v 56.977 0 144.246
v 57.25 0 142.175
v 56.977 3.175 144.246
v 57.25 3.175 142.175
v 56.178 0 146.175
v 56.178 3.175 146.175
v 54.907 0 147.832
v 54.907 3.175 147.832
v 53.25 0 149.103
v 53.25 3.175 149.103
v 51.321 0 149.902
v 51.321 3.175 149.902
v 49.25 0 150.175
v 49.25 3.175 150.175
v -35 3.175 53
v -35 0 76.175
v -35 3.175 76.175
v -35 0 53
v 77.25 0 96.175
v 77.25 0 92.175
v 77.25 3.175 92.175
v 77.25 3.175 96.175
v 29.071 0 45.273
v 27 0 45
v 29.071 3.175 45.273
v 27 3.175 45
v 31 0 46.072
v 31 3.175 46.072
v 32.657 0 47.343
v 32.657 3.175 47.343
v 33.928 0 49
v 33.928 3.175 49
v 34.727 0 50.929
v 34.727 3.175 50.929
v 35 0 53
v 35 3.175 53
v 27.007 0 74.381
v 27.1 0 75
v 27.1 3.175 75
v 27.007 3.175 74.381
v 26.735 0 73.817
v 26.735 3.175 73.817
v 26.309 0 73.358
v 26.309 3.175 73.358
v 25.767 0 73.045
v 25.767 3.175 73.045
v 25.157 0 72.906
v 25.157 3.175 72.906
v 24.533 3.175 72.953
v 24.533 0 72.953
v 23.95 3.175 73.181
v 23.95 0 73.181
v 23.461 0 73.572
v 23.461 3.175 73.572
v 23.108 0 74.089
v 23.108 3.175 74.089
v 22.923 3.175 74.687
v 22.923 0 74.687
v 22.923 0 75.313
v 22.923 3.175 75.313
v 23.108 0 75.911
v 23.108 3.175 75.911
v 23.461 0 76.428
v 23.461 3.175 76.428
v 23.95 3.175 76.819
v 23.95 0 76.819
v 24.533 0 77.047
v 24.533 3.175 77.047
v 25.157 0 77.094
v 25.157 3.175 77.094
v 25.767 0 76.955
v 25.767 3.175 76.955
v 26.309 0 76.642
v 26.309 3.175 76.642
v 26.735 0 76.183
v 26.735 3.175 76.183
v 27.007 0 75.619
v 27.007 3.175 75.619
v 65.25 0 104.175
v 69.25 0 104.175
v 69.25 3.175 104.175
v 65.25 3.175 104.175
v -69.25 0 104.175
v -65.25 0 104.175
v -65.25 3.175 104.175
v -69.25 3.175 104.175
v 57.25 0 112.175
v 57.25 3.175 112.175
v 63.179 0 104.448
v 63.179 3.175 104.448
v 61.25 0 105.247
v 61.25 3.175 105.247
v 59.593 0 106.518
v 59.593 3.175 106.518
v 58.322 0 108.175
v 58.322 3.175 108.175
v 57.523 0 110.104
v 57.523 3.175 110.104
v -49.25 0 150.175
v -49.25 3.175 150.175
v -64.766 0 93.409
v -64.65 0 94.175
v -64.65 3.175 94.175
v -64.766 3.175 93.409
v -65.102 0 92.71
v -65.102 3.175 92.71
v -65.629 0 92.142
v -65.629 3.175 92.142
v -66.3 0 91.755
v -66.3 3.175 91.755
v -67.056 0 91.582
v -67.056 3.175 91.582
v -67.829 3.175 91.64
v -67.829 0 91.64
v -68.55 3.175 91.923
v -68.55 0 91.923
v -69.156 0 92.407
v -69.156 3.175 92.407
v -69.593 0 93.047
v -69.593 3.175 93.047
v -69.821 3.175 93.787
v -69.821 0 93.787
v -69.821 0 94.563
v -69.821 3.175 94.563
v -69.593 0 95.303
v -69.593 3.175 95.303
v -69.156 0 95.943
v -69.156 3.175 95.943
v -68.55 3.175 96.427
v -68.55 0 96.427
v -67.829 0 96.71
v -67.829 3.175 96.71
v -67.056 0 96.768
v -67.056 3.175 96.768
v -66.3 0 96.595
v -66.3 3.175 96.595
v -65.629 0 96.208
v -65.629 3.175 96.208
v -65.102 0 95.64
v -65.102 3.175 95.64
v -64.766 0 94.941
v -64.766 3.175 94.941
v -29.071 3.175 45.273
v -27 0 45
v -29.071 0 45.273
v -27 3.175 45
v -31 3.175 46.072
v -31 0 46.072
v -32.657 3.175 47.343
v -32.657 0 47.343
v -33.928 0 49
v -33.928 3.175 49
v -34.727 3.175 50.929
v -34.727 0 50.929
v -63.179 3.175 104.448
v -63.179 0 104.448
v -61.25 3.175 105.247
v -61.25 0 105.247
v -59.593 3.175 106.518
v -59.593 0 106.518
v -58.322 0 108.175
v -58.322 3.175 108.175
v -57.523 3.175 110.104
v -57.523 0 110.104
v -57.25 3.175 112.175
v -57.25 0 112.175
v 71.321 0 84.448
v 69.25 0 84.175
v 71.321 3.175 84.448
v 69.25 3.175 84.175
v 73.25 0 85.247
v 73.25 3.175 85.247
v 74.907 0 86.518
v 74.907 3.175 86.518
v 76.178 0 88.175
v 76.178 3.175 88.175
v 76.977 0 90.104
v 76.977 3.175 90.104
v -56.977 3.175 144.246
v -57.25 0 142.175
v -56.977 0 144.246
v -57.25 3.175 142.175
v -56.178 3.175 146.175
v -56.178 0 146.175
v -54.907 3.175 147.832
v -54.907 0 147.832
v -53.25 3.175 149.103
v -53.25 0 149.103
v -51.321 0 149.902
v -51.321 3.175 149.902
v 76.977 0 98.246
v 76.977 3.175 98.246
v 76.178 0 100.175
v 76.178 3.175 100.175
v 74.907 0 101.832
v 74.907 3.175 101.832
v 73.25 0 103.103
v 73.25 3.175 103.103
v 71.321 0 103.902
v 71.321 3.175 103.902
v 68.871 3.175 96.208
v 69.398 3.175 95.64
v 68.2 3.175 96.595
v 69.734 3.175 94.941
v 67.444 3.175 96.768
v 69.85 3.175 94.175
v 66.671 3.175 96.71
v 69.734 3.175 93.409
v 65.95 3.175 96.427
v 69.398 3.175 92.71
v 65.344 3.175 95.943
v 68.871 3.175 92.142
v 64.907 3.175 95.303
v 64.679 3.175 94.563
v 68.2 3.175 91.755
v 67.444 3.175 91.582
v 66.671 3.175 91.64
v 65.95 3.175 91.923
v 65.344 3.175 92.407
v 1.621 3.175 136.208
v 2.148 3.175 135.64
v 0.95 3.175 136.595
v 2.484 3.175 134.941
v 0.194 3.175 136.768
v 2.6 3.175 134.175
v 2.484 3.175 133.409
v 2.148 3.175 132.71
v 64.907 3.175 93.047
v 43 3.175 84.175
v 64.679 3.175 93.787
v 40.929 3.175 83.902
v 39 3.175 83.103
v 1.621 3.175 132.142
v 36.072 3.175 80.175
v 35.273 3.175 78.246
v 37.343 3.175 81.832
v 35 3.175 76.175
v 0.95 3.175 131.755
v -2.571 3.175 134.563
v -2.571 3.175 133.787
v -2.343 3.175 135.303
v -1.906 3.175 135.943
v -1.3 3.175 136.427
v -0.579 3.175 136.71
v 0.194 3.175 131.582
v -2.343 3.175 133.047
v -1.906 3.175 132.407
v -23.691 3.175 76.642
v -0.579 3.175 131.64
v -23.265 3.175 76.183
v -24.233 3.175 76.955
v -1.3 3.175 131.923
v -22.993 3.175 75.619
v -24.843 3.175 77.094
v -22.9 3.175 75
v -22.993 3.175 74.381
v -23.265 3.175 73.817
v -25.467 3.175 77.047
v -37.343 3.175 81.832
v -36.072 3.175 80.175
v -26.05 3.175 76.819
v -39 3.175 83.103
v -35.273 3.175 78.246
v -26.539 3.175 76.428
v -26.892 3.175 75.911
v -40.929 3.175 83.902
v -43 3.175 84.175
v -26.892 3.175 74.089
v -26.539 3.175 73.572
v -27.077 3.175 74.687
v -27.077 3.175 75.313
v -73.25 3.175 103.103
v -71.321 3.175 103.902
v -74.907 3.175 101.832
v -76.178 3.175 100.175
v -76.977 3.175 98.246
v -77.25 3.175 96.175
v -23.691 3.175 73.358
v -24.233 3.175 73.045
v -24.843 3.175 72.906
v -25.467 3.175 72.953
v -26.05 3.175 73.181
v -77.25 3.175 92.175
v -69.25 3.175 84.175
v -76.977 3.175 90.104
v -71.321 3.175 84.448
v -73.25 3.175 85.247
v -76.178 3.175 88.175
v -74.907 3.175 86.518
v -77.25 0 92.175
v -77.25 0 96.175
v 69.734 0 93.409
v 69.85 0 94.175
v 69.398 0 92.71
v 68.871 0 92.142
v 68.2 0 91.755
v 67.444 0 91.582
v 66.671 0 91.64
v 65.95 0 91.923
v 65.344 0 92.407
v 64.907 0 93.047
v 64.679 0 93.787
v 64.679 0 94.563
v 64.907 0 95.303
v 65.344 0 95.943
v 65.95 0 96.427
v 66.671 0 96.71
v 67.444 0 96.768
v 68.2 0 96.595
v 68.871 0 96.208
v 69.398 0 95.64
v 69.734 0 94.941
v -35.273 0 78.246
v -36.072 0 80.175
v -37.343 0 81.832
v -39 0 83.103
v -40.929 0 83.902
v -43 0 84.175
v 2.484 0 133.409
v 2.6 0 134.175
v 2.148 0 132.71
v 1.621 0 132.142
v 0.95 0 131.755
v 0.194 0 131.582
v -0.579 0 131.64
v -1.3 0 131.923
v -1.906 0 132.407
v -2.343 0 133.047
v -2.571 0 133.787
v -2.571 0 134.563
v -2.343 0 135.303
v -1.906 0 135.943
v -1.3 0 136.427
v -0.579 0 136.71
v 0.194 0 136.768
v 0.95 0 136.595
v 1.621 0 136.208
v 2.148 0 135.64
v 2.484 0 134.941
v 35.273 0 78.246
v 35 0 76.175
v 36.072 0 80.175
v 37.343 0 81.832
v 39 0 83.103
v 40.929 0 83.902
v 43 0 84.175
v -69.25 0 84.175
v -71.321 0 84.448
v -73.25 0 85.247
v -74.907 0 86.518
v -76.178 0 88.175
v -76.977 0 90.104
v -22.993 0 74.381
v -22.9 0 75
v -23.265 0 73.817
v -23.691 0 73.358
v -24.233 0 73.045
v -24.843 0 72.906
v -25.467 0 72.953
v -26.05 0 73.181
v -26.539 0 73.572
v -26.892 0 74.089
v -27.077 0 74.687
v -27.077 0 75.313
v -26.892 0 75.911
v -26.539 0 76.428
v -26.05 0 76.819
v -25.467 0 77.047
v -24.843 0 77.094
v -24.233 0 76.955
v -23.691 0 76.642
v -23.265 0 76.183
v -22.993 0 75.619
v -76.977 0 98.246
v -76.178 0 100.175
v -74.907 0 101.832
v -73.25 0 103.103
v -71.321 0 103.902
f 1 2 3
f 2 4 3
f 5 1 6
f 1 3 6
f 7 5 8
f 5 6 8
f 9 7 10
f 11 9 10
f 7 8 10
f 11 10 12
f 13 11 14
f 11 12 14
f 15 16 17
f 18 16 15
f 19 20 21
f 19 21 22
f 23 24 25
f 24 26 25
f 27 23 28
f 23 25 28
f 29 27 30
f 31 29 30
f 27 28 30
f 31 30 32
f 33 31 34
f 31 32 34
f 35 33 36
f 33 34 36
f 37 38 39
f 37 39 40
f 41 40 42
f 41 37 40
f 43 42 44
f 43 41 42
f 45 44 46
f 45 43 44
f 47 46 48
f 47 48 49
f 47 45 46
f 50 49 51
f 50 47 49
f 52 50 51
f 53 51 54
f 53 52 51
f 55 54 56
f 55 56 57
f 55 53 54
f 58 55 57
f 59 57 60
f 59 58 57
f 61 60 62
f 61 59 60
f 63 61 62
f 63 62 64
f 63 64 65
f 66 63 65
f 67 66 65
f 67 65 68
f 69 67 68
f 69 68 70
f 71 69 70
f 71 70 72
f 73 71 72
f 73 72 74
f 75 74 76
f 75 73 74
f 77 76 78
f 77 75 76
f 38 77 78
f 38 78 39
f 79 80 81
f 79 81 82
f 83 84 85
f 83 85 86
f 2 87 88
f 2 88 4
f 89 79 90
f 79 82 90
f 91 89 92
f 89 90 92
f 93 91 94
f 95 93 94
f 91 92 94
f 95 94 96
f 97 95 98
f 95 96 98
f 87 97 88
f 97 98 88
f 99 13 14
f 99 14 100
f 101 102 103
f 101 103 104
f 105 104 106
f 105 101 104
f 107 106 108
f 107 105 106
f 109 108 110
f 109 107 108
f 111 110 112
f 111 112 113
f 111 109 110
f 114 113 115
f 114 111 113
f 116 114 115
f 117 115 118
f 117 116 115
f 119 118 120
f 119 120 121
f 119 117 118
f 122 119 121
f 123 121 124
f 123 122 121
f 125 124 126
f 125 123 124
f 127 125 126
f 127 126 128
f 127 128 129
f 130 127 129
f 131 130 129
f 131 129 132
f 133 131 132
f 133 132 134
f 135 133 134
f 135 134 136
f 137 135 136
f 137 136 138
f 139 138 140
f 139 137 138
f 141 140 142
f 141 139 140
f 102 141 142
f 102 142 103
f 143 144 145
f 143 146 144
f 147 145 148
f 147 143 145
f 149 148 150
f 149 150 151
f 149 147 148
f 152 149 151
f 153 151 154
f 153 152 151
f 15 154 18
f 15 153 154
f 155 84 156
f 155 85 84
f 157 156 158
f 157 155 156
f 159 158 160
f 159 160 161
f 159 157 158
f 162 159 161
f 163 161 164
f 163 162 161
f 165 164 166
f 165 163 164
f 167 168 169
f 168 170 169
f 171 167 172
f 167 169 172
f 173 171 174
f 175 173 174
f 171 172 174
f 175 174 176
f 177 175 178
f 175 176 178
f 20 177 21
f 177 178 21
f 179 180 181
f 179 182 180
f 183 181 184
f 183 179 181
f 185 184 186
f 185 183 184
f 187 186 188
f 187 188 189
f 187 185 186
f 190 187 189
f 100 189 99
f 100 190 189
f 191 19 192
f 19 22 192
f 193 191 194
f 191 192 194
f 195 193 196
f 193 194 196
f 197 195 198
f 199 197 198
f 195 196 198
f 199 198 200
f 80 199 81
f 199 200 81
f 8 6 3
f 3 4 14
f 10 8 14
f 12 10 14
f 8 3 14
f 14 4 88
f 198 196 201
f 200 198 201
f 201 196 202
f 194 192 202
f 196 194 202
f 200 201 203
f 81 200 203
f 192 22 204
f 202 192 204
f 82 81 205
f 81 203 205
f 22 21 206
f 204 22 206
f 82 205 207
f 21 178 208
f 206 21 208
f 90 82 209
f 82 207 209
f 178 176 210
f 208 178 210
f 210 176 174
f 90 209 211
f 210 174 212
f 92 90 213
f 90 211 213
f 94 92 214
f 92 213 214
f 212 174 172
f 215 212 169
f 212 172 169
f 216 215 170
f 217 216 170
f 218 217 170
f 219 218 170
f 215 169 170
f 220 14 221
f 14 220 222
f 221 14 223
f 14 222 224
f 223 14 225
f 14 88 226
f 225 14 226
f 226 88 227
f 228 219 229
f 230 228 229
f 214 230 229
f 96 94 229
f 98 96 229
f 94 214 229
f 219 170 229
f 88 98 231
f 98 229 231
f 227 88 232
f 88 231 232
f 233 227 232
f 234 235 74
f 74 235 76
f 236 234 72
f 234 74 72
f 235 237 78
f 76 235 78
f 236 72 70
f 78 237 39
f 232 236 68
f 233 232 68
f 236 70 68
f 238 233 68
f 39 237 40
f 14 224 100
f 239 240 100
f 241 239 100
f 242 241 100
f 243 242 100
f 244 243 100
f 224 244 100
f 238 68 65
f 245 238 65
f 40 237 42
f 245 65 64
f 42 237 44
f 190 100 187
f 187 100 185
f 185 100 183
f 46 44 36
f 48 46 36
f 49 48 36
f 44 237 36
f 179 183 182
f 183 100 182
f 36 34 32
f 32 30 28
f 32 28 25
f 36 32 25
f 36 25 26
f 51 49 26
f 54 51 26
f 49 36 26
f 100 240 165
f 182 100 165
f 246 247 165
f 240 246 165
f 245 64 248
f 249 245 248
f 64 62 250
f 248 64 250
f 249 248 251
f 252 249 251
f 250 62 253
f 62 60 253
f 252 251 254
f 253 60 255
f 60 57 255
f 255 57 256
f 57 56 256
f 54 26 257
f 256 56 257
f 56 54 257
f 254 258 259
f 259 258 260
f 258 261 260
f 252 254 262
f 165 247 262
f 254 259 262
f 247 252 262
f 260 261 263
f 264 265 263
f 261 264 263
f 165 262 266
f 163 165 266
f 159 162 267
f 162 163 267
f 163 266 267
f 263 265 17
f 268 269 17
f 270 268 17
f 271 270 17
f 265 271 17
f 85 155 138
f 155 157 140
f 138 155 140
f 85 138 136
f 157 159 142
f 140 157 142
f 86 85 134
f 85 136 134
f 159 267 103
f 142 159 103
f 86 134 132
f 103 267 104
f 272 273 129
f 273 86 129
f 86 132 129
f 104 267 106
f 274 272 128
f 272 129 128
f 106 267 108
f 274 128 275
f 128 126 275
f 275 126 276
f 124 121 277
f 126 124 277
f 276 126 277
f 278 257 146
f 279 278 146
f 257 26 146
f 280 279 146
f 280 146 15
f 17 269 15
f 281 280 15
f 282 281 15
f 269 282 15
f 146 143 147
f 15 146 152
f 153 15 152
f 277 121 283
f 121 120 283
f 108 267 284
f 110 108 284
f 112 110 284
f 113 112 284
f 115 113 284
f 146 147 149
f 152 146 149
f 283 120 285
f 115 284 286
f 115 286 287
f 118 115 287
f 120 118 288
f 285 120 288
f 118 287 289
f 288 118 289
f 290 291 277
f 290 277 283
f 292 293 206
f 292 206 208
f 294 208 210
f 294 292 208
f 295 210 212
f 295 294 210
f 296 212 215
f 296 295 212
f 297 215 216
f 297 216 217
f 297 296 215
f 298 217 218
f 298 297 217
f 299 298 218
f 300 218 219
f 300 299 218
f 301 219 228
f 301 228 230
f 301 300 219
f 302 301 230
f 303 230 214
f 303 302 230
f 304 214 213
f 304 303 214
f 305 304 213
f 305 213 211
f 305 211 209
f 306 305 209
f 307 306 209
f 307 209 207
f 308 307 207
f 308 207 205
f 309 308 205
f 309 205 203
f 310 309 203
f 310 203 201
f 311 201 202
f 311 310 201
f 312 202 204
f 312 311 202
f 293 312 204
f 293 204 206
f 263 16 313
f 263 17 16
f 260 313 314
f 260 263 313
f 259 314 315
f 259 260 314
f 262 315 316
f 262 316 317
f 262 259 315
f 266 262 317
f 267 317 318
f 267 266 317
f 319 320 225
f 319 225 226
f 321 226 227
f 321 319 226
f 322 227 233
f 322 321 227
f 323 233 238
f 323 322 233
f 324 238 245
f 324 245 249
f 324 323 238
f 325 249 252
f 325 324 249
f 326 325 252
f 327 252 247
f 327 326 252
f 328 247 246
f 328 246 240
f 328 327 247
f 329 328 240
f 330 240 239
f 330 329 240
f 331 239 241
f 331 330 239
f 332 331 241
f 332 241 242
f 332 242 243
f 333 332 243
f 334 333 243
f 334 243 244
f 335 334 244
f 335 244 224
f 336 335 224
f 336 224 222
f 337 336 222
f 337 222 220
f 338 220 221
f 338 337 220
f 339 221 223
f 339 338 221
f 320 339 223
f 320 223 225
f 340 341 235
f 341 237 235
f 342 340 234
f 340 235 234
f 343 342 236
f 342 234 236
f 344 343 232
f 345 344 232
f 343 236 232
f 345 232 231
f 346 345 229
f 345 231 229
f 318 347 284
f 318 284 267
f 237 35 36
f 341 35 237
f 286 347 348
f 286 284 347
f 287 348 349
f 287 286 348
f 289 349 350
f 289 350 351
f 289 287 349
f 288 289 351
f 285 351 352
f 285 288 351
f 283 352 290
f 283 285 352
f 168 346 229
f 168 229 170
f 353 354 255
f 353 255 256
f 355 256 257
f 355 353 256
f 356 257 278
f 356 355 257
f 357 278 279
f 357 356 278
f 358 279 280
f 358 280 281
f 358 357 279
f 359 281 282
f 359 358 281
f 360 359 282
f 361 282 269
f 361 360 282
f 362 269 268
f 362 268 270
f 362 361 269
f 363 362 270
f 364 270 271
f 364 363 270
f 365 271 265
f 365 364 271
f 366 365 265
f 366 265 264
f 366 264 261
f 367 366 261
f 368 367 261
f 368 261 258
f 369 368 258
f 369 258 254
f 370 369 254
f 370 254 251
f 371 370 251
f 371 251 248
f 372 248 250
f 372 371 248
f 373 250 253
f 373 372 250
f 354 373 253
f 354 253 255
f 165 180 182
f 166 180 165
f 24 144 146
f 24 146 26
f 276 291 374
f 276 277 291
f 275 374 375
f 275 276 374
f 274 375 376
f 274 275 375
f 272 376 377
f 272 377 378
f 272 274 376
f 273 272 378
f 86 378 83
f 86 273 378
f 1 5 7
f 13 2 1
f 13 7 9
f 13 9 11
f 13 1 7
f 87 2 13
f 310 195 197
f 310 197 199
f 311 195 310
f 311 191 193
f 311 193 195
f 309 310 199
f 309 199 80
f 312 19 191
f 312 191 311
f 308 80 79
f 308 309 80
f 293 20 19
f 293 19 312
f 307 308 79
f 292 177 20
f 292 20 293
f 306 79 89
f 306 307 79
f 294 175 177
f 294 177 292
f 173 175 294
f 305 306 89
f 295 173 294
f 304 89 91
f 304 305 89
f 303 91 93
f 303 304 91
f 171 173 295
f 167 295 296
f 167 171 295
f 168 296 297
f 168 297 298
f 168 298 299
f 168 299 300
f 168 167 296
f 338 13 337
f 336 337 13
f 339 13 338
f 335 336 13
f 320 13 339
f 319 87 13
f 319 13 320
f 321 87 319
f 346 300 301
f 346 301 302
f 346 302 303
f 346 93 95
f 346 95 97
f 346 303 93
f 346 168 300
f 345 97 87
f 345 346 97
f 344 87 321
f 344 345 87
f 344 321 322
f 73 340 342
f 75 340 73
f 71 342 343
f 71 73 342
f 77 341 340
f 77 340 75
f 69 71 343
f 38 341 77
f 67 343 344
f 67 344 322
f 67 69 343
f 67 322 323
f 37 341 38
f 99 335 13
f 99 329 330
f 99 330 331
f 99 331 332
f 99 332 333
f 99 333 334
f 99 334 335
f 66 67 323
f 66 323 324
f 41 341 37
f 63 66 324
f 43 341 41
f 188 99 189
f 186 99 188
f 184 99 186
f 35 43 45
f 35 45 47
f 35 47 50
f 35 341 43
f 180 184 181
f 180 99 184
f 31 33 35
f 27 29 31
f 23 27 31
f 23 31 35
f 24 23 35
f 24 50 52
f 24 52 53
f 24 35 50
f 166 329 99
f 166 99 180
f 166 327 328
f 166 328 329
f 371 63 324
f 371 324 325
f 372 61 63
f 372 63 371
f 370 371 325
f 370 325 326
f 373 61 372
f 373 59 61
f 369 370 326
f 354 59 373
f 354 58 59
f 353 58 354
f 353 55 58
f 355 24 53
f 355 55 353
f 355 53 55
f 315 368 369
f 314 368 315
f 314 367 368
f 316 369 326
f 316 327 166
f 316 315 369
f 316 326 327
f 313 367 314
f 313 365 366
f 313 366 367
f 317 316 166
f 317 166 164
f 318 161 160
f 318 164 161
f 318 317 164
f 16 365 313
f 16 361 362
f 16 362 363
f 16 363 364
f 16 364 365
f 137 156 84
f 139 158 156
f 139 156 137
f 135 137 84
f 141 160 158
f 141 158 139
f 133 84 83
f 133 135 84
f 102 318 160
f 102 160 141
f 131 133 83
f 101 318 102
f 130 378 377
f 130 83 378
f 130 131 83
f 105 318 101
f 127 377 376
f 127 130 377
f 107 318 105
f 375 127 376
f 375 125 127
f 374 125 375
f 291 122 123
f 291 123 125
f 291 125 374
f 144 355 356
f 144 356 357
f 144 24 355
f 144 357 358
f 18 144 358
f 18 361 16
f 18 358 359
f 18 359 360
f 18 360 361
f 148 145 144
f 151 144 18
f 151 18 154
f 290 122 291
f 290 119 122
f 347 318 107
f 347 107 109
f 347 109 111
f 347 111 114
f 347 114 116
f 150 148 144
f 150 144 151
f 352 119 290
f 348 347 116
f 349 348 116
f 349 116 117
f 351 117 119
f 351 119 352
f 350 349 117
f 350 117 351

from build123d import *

# Parameters (mm, degrees)
SKETCH3_R           = 2.1
SKETCH3_R_2         = 2.6
BOSS_EXTRUDE1_DEPTH = 3.175
FILLET1_R           = 8


with BuildPart() as part:
    # Sketch3 → Boss-Extrude1 (new body)
    with BuildSketch(Plane(origin=(0, 0, 0), x_dir=(1, 0, 0), z_dir=(0, 1, 0))):
        Polygon((-35, -45), (35, -45), (35, -84.175), (77.25, -84.175), (77.25, -104.175), (57.25, -104.175), (57.25, -150.175), (-57.25, -150.175), (-57.25, -104.175), (-77.25, -104.175), (-77.25, -84.175), (-35, -84.175), align=None)
        with Locations((-25, -75)):
            Circle(SKETCH3_R, mode=Mode.SUBTRACT)
        with Locations((25, -75)):
            Circle(SKETCH3_R, mode=Mode.SUBTRACT)
        with Locations((-67.25, -94.175)):
            Circle(SKETCH3_R_2, mode=Mode.SUBTRACT)
        with Locations((67.25, -94.175)):
            Circle(SKETCH3_R_2, mode=Mode.SUBTRACT)
        with Locations((0, -134.175)):
            Circle(SKETCH3_R_2, mode=Mode.SUBTRACT)
    extrude(amount=BOSS_EXTRUDE1_DEPTH)

    # Fillet1
    fillet1_edges = [part.edges().sort_by_distance(p)[0] for p in [
        (35, 1.5875, 84.175),
        (77.25, 1.5875, 84.175),
        (77.25, 1.5875, 104.175),
        (57.25, 1.5875, 104.175),
        (57.25, 1.5875, 150.175),
        (-57.25, 1.5875, 150.175),
        (-57.25, 1.5875, 104.175),
        (-77.25, 1.5875, 104.175),
        (-77.25, 1.5875, 84.175),
        (-35, 1.5875, 84.175),
        (-35, 1.5875, 45),
        (35, 1.5875, 45),
    ]]
    fillet(fillet1_edges, radius=FILLET1_R)


solid = part.part
